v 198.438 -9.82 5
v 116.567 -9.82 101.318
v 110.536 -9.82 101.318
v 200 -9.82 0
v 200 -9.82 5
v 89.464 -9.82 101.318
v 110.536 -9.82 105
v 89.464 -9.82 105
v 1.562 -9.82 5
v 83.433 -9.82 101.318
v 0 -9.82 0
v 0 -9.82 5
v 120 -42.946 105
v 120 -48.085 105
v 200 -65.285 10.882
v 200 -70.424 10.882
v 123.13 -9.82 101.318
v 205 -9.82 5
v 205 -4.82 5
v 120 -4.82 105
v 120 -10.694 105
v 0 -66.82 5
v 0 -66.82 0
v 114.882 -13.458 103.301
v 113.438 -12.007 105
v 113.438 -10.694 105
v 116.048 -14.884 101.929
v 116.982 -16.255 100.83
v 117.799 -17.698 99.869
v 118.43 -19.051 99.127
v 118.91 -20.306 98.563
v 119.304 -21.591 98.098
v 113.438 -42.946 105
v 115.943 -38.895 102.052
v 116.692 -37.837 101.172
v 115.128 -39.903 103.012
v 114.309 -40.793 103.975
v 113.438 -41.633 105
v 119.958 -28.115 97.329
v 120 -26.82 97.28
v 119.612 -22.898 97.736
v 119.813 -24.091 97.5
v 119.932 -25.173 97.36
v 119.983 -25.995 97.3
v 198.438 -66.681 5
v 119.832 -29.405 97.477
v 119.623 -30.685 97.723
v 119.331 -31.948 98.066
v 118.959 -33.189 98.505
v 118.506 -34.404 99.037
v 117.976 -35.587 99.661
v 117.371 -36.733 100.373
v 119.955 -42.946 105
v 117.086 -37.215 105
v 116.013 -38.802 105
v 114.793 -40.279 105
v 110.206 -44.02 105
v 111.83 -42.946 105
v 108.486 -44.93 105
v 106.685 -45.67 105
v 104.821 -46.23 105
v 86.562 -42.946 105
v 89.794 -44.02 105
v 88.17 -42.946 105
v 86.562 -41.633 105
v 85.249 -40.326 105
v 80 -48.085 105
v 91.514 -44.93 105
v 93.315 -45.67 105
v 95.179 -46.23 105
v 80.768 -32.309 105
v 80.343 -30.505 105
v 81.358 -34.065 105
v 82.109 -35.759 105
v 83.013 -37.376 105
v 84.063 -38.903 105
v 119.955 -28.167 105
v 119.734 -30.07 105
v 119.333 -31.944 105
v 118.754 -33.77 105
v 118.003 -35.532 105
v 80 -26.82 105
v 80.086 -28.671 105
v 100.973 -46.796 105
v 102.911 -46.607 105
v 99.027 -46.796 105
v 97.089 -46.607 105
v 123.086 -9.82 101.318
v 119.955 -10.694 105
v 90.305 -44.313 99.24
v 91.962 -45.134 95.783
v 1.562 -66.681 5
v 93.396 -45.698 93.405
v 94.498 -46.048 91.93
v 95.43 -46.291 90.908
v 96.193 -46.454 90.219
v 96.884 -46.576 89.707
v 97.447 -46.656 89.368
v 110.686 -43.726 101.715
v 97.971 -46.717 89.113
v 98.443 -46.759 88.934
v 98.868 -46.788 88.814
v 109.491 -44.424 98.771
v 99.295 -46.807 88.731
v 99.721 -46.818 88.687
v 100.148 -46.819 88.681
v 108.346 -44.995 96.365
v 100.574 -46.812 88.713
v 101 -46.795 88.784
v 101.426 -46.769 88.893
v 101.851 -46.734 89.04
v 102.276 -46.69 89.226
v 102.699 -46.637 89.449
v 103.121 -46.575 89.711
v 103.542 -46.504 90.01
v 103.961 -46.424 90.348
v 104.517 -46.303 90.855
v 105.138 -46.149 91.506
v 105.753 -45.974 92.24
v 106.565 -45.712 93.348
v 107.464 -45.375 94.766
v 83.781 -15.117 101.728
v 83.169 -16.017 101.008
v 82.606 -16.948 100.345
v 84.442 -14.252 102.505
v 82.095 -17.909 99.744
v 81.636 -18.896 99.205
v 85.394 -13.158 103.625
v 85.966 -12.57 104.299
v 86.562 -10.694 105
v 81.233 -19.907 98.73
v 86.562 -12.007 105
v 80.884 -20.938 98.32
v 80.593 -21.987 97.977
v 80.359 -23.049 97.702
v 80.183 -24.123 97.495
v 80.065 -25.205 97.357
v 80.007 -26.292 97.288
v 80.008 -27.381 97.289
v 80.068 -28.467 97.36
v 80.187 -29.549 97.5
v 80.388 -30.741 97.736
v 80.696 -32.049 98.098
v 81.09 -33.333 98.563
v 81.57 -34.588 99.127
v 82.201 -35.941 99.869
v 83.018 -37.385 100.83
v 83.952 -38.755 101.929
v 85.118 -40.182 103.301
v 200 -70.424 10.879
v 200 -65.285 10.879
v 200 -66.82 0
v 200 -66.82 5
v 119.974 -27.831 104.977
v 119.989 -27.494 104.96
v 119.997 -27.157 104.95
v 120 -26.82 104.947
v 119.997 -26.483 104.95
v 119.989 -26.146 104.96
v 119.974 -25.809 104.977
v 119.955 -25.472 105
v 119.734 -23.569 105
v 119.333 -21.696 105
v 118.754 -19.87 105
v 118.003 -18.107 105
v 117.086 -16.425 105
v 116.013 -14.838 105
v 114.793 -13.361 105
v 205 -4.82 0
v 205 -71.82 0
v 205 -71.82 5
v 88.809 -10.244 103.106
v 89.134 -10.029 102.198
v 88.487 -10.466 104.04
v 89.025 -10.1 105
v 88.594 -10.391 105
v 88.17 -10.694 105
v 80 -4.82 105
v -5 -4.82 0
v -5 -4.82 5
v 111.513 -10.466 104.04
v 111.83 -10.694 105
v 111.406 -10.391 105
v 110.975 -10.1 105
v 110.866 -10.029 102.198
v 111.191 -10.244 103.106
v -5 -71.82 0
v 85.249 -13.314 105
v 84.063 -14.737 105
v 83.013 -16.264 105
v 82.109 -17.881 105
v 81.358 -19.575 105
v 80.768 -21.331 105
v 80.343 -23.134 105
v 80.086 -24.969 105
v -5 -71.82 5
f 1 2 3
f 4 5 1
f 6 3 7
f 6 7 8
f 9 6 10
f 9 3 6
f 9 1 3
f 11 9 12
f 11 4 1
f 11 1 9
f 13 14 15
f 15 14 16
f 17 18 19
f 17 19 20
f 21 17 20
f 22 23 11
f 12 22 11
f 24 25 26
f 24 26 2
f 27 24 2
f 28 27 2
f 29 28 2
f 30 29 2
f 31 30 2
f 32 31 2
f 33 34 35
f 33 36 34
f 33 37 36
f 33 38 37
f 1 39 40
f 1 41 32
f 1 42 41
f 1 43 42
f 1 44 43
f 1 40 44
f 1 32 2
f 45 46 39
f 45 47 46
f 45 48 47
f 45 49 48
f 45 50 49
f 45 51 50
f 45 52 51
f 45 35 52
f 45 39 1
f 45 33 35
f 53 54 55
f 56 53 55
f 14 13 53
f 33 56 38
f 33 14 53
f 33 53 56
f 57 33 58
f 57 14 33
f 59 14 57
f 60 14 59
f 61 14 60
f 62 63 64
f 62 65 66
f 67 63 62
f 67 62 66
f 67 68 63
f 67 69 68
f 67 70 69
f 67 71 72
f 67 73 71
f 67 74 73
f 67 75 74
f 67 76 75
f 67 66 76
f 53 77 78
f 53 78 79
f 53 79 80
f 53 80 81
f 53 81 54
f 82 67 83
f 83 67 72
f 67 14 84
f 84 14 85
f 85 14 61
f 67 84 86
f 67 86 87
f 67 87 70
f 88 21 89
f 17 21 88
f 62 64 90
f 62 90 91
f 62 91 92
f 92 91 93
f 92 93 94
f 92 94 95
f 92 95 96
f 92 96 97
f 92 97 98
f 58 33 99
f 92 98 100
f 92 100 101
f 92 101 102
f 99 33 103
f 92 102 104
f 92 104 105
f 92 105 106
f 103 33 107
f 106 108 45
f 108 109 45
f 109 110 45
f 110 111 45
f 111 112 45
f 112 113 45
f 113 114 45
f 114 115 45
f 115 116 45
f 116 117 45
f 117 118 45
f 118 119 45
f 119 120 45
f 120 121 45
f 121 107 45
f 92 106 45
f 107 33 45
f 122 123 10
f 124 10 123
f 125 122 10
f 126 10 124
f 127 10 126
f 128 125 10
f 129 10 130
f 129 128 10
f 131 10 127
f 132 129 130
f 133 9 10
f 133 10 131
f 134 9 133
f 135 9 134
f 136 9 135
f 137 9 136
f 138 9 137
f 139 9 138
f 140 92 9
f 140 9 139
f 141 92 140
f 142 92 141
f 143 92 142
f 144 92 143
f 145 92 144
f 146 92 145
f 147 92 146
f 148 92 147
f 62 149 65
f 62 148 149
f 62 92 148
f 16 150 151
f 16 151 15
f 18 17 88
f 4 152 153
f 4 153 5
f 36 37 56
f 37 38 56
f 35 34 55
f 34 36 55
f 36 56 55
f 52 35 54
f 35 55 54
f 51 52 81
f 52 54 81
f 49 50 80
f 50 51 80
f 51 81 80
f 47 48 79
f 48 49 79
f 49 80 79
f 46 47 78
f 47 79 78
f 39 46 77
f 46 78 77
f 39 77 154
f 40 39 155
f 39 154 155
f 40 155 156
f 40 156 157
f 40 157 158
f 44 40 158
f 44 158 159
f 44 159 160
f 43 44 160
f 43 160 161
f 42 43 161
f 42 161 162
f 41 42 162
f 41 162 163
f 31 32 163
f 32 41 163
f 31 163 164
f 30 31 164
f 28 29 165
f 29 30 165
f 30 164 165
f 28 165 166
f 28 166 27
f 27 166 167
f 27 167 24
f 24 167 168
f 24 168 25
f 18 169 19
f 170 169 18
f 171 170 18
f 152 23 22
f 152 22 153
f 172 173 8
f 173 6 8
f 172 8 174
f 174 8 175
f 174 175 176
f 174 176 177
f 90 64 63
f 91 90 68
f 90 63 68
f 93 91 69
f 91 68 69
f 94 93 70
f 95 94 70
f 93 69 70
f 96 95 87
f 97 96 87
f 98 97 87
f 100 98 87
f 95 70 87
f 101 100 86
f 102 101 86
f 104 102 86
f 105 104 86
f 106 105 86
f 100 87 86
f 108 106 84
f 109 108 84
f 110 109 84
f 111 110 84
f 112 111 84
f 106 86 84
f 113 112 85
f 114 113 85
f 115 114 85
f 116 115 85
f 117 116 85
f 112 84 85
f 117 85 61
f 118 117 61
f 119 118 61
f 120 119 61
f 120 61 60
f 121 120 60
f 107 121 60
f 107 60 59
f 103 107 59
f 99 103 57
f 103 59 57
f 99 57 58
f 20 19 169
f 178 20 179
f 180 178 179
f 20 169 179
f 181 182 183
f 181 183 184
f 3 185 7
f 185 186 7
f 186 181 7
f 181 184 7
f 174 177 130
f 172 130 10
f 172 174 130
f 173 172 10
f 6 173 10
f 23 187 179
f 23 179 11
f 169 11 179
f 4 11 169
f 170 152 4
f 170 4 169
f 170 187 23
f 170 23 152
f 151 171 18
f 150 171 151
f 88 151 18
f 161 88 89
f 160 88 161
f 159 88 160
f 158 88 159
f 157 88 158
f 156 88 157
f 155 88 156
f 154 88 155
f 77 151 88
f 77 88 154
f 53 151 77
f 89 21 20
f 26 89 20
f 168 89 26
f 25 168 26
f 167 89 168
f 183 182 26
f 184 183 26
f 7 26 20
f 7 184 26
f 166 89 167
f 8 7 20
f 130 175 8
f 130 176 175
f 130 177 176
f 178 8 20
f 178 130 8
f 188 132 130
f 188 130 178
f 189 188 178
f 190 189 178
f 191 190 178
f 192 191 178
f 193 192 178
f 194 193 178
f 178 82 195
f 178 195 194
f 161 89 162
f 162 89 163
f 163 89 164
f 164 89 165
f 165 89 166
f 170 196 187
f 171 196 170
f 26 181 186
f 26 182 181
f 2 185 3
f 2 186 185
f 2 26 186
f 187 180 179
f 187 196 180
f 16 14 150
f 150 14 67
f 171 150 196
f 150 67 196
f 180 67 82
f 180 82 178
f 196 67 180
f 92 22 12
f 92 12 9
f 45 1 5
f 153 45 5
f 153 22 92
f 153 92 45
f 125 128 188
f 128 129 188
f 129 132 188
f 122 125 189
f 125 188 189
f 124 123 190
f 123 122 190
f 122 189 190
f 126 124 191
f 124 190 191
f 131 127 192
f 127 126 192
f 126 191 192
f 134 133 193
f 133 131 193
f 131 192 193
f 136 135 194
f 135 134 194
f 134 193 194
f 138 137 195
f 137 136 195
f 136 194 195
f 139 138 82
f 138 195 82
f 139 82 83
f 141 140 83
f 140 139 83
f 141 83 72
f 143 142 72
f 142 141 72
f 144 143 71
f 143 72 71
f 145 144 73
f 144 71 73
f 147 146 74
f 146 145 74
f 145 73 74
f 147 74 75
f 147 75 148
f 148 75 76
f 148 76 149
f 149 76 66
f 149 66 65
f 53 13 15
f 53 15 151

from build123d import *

# Parameters (mm, degrees)
ESQUISSE1_W                  = 210
ESQUISSE1_H                  = 90
ESQUISSE1_W_2                = 200
ESQUISSE1_H_2                = 80
BOSS_EXTRU_1_DEPTH           = 5
ESQUISSE2_R                  = 20
ESQUISSE2_R_2                = 15
BOSS_EXTRU_2_DEPTH           = 5
BOSS_EXTRU_3_DEPTH           = 90
BOSS_EXTRU_4_DEPTH           = 200
ESQUISSE6_W                  = 26.875595252
ESQUISSE6_H                  = 32.252188949
ENL_V_MAT_EXTRU_1_DEPTH      = 200
ENL_V_MAT_EXTRU_2_DEPTH      = 200
ENL_V_MAT_EXTRU_3_DEPTH      = 237
ESQUISSE10_R                 = 20
ENL_V_MAT_EXTRU_4_DEPTH      = 6
ENL_V_MAT_EXTRU_4_DEPTH_BACK = 106
ESQUISSE11_W                 = 294.385058415
ESQUISSE11_H                 = 160.265549893
ENL_V_MAT_EXTRU_5_DEPTH      = 23
ENL_V_MAT_EXTRU_5_DEPTH_BACK = 16
BOSS_EXTRU_5_DEPTH           = 5


with BuildPart() as part:
    # Esquisse1 → Boss.-Extru.1 (new body)
    with BuildSketch(Plane.XY):
        with Locations((100, -26.819835627)):
            Rectangle(ESQUISSE1_W, ESQUISSE1_H)
        with Locations((100, -26.819835627)):
            Rectangle(ESQUISSE1_W_2, ESQUISSE1_H_2, mode=Mode.SUBTRACT)
    extrude(amount=BOSS_EXTRU_1_DEPTH)



with BuildPart() as body_2:
    # Esquisse2 → Boss.-Extru.2 (new body)
    with BuildSketch(Plane.XY.offset(105)):
        with Locations((100, -26.819835627)):
            Circle(ESQUISSE2_R)
        with Locations((100, -26.819835627)):
            Circle(ESQUISSE2_R_2, mode=Mode.SUBTRACT)
    extrude(amount=BOSS_EXTRU_2_DEPTH)


with BuildPart() as part_1:
    add(part.part)

    add(body_2.part)  # Boss.-Extru.3 merges body 2
    # Esquisse3 → Boss.-Extru.3 (add)
    with BuildSketch(Plane.XZ.offset(71.819835627)):
        Polygon((113.437797626, 105), (198.437797626, 5), (205, 5), (119.954563332, 105), align=None)
        Polygon((80, 105), (-5, 5), (1.562202374, 5), (86.562202374, 105), align=None)
    extrude(amount=-BOSS_EXTRU_3_DEPTH)

    # Esquisse5 → Boss.-Extru.4 (add)
    with BuildSketch(Plane.ZY.offset(-200)):
        Polygon((5, 18.180164373), (105, -5.554833167), (105, -10.693741152), (5, 13.041256389), align=None)
        Polygon((5, -71.819835627), (105, -48.084838086), (105, -42.945930101), (5, -66.680927642), align=None)
    extrude(amount=BOSS_EXTRU_4_DEPTH)

    # Esquisse6 → Enlèv. mat.-Extru.1 (cut)
    with BuildSketch(Plane(origin=(0, 0, 105), x_dir=(-1, 0, 0), z_dir=(0, 0, -1))):
        with Locations((-100, -26.819835627)):
            Rectangle(ESQUISSE6_W, ESQUISSE6_H)
    extrude(amount=-ENL_V_MAT_EXTRU_1_DEPTH, mode=Mode.SUBTRACT)

    # Esquisse8 → Enlèv. mat.-Extru.2 (cut)
    with BuildSketch(Plane.XZ.offset(71.819835627)):
        Polygon((0, 105), (80, 105), (0, 10.882352941), align=None)
        Polygon((120, 105), (200, 10.882352941), (200, 105), align=None)
    extrude(amount=-ENL_V_MAT_EXTRU_2_DEPTH, mode=Mode.SUBTRACT)

    # Esquisse9 → Enlèv. mat.-Extru.3 (cut)
    with BuildSketch(Plane.ZY.offset(5)):
        Polygon((105, 18.180164373), (105, -5.554833167), (5, 18.180164373), align=None)
        Polygon((5, -71.819835627), (105, -71.819835627), (105, -48.084838086), align=None)
    extrude(amount=-ENL_V_MAT_EXTRU_3_DEPTH, mode=Mode.SUBTRACT)

    # Esquisse10 → Enlèv. mat.-Extru.4 (cut, two sides)
    with BuildSketch(Plane.XY.offset(105)) as enl_v_mat_extru_4_sk:
        with Locations((100, -26.819835627)):
            Circle(ESQUISSE10_R)
    extrude(amount=ENL_V_MAT_EXTRU_4_DEPTH, mode=Mode.SUBTRACT)
    extrude(enl_v_mat_extru_4_sk.sketch, amount=-ENL_V_MAT_EXTRU_4_DEPTH_BACK, mode=Mode.SUBTRACT)

    # Esquisse11 → Enlèv. mat.-Extru.5 (cut, two sides)
    with BuildSketch(Plane(origin=(0, 13.180164373, 0), x_dir=(-1, 0, 0), z_dir=(0, -1, 0))) as enl_v_mat_extru_5_sk:
        with Locations((-99.239876108, -40.996630143)):
            Rectangle(ESQUISSE11_W, ESQUISSE11_H)
    extrude(amount=ENL_V_MAT_EXTRU_5_DEPTH, mode=Mode.SUBTRACT)
    extrude(enl_v_mat_extru_5_sk.sketch, amount=-ENL_V_MAT_EXTRU_5_DEPTH_BACK, mode=Mode.SUBTRACT)

    # Esquisse12 → Boss.-Extru.5 (add)
    with BuildSketch(Plane(origin=(0, -9.819835627, 0), x_dir=(1, 0, 0), z_dir=(0, 1, 0))):
        Polygon((-5, -5), (-5, 0), (205, 0), (205, -5), (120, -105), (80, -105), align=None)
    extrude(amount=BOSS_EXTRU_5_DEPTH)


solid = part_1.part
